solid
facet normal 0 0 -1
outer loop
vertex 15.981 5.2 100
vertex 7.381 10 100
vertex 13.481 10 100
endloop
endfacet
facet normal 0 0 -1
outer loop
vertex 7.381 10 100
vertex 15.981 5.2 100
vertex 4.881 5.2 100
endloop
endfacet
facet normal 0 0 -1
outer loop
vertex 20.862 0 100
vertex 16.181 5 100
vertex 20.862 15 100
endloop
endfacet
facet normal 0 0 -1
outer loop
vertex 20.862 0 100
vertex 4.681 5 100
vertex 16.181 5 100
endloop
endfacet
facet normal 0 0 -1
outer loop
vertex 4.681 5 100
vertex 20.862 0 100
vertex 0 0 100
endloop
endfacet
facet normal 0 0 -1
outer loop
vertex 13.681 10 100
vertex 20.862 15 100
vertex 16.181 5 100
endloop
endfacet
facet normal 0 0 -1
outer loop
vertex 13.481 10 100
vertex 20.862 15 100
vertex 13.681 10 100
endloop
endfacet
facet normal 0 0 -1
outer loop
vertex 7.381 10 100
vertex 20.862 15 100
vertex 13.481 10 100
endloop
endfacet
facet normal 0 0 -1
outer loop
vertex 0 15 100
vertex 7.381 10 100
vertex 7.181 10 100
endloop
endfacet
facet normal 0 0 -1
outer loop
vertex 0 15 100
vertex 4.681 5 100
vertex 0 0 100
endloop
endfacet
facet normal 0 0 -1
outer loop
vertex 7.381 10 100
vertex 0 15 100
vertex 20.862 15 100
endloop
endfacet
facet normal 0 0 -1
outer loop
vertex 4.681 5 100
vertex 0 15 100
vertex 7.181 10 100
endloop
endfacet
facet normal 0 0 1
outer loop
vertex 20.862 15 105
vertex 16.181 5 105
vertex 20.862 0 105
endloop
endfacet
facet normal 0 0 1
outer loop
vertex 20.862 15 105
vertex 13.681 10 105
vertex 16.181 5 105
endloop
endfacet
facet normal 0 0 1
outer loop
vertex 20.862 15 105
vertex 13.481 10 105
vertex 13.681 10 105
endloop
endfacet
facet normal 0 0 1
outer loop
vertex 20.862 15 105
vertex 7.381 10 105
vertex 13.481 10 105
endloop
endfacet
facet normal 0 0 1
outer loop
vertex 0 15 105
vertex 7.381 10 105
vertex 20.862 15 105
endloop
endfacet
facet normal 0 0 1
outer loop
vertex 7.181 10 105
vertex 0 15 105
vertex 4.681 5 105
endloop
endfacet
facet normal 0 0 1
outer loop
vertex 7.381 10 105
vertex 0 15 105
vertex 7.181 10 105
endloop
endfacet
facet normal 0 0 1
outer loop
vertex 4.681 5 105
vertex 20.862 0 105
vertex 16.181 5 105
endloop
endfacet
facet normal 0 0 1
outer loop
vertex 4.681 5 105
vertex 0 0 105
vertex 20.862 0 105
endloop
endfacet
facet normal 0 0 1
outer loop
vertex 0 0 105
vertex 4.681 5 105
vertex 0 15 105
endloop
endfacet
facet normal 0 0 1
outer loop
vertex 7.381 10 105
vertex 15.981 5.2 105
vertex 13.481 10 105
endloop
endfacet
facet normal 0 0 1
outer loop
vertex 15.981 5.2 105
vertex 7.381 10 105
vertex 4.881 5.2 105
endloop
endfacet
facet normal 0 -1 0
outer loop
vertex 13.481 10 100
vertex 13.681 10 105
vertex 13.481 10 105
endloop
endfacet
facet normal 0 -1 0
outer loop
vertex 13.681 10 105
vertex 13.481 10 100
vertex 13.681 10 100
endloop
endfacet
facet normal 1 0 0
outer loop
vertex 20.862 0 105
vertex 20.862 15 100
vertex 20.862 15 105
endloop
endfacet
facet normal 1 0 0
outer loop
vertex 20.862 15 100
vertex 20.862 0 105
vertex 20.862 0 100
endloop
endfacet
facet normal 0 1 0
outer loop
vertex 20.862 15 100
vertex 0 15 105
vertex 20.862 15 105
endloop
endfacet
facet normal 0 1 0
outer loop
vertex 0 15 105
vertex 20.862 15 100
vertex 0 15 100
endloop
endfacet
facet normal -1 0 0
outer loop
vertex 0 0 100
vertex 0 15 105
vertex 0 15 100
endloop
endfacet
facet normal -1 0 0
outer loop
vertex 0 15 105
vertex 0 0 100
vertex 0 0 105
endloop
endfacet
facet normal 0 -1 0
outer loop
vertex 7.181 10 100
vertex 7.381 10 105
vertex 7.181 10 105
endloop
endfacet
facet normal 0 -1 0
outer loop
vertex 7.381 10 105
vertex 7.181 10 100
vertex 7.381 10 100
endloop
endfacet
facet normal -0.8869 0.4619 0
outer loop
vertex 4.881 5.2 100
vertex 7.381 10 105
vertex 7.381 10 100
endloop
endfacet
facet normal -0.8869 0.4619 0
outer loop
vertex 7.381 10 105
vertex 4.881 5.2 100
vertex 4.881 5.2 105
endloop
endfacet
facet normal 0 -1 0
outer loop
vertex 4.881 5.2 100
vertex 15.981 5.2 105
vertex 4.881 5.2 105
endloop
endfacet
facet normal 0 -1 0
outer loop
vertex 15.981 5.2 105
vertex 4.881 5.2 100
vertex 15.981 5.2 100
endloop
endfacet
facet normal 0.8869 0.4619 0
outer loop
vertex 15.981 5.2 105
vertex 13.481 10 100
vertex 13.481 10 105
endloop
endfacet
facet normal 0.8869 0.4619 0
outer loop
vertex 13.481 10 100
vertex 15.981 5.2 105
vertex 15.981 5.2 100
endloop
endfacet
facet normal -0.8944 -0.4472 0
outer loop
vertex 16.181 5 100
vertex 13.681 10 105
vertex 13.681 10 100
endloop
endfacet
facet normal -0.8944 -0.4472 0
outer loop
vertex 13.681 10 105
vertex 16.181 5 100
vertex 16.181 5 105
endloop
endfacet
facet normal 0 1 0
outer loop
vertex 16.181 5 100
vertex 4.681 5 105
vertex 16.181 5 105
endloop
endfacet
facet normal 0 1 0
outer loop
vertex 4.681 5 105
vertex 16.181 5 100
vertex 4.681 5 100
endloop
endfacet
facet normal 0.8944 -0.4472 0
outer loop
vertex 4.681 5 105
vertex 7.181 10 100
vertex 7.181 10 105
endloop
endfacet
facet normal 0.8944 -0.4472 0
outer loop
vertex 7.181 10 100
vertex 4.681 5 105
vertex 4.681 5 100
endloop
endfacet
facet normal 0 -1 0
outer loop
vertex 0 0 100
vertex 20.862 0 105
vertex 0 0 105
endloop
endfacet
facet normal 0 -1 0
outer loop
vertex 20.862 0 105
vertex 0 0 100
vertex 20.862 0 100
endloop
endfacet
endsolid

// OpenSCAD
//-----Teste de Encaixe do Rabo de Andorinha-----//
r=3;
d=20+5.15;
h=9;
nx=5;
ny=5;
geo=1;
res=10;

aux=2*d+5.15+10;
aux2=40.7-24.2+111.70-16.7-5.15/2;
aux3=11/2;
aux4=(37.55+4)/2 - (16.35+5.1/2-13.2);

cc=25;
ff=37.5;
gg=0.2; // TESTE AQUI: MUDE O "gg" CASO NECESSÁRIO

shift=(10)/2;
shift2=(2)/2;

h_alt=11/2;
hip=h_alt/(sin(60));

o_ext=d*0.75+2*shift; // Segundo rabo de andorinha
o_ext2=2*shift2+d*0.75; //Primeiro rabo de andorinha

translate([0,0,0]){
    translate([-(15-shift2+(20-(d*0.75))/2),-30,100])linear_extrude(5)polygon(points=[[35+shift2-(20-(d*0.75))/2,45],[35+shift2-(20-(d*0.75))/2,40],[27.5-gg+shift2*0.75,40],[30-gg+shift2*0.75,35+gg],[20+gg-shift2*0.75,35+gg],[22.5+gg-shift2*0.75,40],[15-shift2+(20-(d*0.75))/2,40],[15-shift2+(20-(d*0.75))/2,45]]); 
    translate([-(15-shift2+(20-(d*0.75))/2),-30,100])linear_extrude(5)polygon(points=[[15-shift2+(20-(d*0.75))/2,30],[35+shift2-(20-(d*0.75))/2,30],[35+shift2-(20-(d*0.75))/2,40],[27.5+shift2*0.75,40],[30+shift2*0.75,35],[20-shift2*0.75,35],[22.5-shift2*0.75,40],[15-shift2+(20-(d*0.75))/2,40]]);
};
